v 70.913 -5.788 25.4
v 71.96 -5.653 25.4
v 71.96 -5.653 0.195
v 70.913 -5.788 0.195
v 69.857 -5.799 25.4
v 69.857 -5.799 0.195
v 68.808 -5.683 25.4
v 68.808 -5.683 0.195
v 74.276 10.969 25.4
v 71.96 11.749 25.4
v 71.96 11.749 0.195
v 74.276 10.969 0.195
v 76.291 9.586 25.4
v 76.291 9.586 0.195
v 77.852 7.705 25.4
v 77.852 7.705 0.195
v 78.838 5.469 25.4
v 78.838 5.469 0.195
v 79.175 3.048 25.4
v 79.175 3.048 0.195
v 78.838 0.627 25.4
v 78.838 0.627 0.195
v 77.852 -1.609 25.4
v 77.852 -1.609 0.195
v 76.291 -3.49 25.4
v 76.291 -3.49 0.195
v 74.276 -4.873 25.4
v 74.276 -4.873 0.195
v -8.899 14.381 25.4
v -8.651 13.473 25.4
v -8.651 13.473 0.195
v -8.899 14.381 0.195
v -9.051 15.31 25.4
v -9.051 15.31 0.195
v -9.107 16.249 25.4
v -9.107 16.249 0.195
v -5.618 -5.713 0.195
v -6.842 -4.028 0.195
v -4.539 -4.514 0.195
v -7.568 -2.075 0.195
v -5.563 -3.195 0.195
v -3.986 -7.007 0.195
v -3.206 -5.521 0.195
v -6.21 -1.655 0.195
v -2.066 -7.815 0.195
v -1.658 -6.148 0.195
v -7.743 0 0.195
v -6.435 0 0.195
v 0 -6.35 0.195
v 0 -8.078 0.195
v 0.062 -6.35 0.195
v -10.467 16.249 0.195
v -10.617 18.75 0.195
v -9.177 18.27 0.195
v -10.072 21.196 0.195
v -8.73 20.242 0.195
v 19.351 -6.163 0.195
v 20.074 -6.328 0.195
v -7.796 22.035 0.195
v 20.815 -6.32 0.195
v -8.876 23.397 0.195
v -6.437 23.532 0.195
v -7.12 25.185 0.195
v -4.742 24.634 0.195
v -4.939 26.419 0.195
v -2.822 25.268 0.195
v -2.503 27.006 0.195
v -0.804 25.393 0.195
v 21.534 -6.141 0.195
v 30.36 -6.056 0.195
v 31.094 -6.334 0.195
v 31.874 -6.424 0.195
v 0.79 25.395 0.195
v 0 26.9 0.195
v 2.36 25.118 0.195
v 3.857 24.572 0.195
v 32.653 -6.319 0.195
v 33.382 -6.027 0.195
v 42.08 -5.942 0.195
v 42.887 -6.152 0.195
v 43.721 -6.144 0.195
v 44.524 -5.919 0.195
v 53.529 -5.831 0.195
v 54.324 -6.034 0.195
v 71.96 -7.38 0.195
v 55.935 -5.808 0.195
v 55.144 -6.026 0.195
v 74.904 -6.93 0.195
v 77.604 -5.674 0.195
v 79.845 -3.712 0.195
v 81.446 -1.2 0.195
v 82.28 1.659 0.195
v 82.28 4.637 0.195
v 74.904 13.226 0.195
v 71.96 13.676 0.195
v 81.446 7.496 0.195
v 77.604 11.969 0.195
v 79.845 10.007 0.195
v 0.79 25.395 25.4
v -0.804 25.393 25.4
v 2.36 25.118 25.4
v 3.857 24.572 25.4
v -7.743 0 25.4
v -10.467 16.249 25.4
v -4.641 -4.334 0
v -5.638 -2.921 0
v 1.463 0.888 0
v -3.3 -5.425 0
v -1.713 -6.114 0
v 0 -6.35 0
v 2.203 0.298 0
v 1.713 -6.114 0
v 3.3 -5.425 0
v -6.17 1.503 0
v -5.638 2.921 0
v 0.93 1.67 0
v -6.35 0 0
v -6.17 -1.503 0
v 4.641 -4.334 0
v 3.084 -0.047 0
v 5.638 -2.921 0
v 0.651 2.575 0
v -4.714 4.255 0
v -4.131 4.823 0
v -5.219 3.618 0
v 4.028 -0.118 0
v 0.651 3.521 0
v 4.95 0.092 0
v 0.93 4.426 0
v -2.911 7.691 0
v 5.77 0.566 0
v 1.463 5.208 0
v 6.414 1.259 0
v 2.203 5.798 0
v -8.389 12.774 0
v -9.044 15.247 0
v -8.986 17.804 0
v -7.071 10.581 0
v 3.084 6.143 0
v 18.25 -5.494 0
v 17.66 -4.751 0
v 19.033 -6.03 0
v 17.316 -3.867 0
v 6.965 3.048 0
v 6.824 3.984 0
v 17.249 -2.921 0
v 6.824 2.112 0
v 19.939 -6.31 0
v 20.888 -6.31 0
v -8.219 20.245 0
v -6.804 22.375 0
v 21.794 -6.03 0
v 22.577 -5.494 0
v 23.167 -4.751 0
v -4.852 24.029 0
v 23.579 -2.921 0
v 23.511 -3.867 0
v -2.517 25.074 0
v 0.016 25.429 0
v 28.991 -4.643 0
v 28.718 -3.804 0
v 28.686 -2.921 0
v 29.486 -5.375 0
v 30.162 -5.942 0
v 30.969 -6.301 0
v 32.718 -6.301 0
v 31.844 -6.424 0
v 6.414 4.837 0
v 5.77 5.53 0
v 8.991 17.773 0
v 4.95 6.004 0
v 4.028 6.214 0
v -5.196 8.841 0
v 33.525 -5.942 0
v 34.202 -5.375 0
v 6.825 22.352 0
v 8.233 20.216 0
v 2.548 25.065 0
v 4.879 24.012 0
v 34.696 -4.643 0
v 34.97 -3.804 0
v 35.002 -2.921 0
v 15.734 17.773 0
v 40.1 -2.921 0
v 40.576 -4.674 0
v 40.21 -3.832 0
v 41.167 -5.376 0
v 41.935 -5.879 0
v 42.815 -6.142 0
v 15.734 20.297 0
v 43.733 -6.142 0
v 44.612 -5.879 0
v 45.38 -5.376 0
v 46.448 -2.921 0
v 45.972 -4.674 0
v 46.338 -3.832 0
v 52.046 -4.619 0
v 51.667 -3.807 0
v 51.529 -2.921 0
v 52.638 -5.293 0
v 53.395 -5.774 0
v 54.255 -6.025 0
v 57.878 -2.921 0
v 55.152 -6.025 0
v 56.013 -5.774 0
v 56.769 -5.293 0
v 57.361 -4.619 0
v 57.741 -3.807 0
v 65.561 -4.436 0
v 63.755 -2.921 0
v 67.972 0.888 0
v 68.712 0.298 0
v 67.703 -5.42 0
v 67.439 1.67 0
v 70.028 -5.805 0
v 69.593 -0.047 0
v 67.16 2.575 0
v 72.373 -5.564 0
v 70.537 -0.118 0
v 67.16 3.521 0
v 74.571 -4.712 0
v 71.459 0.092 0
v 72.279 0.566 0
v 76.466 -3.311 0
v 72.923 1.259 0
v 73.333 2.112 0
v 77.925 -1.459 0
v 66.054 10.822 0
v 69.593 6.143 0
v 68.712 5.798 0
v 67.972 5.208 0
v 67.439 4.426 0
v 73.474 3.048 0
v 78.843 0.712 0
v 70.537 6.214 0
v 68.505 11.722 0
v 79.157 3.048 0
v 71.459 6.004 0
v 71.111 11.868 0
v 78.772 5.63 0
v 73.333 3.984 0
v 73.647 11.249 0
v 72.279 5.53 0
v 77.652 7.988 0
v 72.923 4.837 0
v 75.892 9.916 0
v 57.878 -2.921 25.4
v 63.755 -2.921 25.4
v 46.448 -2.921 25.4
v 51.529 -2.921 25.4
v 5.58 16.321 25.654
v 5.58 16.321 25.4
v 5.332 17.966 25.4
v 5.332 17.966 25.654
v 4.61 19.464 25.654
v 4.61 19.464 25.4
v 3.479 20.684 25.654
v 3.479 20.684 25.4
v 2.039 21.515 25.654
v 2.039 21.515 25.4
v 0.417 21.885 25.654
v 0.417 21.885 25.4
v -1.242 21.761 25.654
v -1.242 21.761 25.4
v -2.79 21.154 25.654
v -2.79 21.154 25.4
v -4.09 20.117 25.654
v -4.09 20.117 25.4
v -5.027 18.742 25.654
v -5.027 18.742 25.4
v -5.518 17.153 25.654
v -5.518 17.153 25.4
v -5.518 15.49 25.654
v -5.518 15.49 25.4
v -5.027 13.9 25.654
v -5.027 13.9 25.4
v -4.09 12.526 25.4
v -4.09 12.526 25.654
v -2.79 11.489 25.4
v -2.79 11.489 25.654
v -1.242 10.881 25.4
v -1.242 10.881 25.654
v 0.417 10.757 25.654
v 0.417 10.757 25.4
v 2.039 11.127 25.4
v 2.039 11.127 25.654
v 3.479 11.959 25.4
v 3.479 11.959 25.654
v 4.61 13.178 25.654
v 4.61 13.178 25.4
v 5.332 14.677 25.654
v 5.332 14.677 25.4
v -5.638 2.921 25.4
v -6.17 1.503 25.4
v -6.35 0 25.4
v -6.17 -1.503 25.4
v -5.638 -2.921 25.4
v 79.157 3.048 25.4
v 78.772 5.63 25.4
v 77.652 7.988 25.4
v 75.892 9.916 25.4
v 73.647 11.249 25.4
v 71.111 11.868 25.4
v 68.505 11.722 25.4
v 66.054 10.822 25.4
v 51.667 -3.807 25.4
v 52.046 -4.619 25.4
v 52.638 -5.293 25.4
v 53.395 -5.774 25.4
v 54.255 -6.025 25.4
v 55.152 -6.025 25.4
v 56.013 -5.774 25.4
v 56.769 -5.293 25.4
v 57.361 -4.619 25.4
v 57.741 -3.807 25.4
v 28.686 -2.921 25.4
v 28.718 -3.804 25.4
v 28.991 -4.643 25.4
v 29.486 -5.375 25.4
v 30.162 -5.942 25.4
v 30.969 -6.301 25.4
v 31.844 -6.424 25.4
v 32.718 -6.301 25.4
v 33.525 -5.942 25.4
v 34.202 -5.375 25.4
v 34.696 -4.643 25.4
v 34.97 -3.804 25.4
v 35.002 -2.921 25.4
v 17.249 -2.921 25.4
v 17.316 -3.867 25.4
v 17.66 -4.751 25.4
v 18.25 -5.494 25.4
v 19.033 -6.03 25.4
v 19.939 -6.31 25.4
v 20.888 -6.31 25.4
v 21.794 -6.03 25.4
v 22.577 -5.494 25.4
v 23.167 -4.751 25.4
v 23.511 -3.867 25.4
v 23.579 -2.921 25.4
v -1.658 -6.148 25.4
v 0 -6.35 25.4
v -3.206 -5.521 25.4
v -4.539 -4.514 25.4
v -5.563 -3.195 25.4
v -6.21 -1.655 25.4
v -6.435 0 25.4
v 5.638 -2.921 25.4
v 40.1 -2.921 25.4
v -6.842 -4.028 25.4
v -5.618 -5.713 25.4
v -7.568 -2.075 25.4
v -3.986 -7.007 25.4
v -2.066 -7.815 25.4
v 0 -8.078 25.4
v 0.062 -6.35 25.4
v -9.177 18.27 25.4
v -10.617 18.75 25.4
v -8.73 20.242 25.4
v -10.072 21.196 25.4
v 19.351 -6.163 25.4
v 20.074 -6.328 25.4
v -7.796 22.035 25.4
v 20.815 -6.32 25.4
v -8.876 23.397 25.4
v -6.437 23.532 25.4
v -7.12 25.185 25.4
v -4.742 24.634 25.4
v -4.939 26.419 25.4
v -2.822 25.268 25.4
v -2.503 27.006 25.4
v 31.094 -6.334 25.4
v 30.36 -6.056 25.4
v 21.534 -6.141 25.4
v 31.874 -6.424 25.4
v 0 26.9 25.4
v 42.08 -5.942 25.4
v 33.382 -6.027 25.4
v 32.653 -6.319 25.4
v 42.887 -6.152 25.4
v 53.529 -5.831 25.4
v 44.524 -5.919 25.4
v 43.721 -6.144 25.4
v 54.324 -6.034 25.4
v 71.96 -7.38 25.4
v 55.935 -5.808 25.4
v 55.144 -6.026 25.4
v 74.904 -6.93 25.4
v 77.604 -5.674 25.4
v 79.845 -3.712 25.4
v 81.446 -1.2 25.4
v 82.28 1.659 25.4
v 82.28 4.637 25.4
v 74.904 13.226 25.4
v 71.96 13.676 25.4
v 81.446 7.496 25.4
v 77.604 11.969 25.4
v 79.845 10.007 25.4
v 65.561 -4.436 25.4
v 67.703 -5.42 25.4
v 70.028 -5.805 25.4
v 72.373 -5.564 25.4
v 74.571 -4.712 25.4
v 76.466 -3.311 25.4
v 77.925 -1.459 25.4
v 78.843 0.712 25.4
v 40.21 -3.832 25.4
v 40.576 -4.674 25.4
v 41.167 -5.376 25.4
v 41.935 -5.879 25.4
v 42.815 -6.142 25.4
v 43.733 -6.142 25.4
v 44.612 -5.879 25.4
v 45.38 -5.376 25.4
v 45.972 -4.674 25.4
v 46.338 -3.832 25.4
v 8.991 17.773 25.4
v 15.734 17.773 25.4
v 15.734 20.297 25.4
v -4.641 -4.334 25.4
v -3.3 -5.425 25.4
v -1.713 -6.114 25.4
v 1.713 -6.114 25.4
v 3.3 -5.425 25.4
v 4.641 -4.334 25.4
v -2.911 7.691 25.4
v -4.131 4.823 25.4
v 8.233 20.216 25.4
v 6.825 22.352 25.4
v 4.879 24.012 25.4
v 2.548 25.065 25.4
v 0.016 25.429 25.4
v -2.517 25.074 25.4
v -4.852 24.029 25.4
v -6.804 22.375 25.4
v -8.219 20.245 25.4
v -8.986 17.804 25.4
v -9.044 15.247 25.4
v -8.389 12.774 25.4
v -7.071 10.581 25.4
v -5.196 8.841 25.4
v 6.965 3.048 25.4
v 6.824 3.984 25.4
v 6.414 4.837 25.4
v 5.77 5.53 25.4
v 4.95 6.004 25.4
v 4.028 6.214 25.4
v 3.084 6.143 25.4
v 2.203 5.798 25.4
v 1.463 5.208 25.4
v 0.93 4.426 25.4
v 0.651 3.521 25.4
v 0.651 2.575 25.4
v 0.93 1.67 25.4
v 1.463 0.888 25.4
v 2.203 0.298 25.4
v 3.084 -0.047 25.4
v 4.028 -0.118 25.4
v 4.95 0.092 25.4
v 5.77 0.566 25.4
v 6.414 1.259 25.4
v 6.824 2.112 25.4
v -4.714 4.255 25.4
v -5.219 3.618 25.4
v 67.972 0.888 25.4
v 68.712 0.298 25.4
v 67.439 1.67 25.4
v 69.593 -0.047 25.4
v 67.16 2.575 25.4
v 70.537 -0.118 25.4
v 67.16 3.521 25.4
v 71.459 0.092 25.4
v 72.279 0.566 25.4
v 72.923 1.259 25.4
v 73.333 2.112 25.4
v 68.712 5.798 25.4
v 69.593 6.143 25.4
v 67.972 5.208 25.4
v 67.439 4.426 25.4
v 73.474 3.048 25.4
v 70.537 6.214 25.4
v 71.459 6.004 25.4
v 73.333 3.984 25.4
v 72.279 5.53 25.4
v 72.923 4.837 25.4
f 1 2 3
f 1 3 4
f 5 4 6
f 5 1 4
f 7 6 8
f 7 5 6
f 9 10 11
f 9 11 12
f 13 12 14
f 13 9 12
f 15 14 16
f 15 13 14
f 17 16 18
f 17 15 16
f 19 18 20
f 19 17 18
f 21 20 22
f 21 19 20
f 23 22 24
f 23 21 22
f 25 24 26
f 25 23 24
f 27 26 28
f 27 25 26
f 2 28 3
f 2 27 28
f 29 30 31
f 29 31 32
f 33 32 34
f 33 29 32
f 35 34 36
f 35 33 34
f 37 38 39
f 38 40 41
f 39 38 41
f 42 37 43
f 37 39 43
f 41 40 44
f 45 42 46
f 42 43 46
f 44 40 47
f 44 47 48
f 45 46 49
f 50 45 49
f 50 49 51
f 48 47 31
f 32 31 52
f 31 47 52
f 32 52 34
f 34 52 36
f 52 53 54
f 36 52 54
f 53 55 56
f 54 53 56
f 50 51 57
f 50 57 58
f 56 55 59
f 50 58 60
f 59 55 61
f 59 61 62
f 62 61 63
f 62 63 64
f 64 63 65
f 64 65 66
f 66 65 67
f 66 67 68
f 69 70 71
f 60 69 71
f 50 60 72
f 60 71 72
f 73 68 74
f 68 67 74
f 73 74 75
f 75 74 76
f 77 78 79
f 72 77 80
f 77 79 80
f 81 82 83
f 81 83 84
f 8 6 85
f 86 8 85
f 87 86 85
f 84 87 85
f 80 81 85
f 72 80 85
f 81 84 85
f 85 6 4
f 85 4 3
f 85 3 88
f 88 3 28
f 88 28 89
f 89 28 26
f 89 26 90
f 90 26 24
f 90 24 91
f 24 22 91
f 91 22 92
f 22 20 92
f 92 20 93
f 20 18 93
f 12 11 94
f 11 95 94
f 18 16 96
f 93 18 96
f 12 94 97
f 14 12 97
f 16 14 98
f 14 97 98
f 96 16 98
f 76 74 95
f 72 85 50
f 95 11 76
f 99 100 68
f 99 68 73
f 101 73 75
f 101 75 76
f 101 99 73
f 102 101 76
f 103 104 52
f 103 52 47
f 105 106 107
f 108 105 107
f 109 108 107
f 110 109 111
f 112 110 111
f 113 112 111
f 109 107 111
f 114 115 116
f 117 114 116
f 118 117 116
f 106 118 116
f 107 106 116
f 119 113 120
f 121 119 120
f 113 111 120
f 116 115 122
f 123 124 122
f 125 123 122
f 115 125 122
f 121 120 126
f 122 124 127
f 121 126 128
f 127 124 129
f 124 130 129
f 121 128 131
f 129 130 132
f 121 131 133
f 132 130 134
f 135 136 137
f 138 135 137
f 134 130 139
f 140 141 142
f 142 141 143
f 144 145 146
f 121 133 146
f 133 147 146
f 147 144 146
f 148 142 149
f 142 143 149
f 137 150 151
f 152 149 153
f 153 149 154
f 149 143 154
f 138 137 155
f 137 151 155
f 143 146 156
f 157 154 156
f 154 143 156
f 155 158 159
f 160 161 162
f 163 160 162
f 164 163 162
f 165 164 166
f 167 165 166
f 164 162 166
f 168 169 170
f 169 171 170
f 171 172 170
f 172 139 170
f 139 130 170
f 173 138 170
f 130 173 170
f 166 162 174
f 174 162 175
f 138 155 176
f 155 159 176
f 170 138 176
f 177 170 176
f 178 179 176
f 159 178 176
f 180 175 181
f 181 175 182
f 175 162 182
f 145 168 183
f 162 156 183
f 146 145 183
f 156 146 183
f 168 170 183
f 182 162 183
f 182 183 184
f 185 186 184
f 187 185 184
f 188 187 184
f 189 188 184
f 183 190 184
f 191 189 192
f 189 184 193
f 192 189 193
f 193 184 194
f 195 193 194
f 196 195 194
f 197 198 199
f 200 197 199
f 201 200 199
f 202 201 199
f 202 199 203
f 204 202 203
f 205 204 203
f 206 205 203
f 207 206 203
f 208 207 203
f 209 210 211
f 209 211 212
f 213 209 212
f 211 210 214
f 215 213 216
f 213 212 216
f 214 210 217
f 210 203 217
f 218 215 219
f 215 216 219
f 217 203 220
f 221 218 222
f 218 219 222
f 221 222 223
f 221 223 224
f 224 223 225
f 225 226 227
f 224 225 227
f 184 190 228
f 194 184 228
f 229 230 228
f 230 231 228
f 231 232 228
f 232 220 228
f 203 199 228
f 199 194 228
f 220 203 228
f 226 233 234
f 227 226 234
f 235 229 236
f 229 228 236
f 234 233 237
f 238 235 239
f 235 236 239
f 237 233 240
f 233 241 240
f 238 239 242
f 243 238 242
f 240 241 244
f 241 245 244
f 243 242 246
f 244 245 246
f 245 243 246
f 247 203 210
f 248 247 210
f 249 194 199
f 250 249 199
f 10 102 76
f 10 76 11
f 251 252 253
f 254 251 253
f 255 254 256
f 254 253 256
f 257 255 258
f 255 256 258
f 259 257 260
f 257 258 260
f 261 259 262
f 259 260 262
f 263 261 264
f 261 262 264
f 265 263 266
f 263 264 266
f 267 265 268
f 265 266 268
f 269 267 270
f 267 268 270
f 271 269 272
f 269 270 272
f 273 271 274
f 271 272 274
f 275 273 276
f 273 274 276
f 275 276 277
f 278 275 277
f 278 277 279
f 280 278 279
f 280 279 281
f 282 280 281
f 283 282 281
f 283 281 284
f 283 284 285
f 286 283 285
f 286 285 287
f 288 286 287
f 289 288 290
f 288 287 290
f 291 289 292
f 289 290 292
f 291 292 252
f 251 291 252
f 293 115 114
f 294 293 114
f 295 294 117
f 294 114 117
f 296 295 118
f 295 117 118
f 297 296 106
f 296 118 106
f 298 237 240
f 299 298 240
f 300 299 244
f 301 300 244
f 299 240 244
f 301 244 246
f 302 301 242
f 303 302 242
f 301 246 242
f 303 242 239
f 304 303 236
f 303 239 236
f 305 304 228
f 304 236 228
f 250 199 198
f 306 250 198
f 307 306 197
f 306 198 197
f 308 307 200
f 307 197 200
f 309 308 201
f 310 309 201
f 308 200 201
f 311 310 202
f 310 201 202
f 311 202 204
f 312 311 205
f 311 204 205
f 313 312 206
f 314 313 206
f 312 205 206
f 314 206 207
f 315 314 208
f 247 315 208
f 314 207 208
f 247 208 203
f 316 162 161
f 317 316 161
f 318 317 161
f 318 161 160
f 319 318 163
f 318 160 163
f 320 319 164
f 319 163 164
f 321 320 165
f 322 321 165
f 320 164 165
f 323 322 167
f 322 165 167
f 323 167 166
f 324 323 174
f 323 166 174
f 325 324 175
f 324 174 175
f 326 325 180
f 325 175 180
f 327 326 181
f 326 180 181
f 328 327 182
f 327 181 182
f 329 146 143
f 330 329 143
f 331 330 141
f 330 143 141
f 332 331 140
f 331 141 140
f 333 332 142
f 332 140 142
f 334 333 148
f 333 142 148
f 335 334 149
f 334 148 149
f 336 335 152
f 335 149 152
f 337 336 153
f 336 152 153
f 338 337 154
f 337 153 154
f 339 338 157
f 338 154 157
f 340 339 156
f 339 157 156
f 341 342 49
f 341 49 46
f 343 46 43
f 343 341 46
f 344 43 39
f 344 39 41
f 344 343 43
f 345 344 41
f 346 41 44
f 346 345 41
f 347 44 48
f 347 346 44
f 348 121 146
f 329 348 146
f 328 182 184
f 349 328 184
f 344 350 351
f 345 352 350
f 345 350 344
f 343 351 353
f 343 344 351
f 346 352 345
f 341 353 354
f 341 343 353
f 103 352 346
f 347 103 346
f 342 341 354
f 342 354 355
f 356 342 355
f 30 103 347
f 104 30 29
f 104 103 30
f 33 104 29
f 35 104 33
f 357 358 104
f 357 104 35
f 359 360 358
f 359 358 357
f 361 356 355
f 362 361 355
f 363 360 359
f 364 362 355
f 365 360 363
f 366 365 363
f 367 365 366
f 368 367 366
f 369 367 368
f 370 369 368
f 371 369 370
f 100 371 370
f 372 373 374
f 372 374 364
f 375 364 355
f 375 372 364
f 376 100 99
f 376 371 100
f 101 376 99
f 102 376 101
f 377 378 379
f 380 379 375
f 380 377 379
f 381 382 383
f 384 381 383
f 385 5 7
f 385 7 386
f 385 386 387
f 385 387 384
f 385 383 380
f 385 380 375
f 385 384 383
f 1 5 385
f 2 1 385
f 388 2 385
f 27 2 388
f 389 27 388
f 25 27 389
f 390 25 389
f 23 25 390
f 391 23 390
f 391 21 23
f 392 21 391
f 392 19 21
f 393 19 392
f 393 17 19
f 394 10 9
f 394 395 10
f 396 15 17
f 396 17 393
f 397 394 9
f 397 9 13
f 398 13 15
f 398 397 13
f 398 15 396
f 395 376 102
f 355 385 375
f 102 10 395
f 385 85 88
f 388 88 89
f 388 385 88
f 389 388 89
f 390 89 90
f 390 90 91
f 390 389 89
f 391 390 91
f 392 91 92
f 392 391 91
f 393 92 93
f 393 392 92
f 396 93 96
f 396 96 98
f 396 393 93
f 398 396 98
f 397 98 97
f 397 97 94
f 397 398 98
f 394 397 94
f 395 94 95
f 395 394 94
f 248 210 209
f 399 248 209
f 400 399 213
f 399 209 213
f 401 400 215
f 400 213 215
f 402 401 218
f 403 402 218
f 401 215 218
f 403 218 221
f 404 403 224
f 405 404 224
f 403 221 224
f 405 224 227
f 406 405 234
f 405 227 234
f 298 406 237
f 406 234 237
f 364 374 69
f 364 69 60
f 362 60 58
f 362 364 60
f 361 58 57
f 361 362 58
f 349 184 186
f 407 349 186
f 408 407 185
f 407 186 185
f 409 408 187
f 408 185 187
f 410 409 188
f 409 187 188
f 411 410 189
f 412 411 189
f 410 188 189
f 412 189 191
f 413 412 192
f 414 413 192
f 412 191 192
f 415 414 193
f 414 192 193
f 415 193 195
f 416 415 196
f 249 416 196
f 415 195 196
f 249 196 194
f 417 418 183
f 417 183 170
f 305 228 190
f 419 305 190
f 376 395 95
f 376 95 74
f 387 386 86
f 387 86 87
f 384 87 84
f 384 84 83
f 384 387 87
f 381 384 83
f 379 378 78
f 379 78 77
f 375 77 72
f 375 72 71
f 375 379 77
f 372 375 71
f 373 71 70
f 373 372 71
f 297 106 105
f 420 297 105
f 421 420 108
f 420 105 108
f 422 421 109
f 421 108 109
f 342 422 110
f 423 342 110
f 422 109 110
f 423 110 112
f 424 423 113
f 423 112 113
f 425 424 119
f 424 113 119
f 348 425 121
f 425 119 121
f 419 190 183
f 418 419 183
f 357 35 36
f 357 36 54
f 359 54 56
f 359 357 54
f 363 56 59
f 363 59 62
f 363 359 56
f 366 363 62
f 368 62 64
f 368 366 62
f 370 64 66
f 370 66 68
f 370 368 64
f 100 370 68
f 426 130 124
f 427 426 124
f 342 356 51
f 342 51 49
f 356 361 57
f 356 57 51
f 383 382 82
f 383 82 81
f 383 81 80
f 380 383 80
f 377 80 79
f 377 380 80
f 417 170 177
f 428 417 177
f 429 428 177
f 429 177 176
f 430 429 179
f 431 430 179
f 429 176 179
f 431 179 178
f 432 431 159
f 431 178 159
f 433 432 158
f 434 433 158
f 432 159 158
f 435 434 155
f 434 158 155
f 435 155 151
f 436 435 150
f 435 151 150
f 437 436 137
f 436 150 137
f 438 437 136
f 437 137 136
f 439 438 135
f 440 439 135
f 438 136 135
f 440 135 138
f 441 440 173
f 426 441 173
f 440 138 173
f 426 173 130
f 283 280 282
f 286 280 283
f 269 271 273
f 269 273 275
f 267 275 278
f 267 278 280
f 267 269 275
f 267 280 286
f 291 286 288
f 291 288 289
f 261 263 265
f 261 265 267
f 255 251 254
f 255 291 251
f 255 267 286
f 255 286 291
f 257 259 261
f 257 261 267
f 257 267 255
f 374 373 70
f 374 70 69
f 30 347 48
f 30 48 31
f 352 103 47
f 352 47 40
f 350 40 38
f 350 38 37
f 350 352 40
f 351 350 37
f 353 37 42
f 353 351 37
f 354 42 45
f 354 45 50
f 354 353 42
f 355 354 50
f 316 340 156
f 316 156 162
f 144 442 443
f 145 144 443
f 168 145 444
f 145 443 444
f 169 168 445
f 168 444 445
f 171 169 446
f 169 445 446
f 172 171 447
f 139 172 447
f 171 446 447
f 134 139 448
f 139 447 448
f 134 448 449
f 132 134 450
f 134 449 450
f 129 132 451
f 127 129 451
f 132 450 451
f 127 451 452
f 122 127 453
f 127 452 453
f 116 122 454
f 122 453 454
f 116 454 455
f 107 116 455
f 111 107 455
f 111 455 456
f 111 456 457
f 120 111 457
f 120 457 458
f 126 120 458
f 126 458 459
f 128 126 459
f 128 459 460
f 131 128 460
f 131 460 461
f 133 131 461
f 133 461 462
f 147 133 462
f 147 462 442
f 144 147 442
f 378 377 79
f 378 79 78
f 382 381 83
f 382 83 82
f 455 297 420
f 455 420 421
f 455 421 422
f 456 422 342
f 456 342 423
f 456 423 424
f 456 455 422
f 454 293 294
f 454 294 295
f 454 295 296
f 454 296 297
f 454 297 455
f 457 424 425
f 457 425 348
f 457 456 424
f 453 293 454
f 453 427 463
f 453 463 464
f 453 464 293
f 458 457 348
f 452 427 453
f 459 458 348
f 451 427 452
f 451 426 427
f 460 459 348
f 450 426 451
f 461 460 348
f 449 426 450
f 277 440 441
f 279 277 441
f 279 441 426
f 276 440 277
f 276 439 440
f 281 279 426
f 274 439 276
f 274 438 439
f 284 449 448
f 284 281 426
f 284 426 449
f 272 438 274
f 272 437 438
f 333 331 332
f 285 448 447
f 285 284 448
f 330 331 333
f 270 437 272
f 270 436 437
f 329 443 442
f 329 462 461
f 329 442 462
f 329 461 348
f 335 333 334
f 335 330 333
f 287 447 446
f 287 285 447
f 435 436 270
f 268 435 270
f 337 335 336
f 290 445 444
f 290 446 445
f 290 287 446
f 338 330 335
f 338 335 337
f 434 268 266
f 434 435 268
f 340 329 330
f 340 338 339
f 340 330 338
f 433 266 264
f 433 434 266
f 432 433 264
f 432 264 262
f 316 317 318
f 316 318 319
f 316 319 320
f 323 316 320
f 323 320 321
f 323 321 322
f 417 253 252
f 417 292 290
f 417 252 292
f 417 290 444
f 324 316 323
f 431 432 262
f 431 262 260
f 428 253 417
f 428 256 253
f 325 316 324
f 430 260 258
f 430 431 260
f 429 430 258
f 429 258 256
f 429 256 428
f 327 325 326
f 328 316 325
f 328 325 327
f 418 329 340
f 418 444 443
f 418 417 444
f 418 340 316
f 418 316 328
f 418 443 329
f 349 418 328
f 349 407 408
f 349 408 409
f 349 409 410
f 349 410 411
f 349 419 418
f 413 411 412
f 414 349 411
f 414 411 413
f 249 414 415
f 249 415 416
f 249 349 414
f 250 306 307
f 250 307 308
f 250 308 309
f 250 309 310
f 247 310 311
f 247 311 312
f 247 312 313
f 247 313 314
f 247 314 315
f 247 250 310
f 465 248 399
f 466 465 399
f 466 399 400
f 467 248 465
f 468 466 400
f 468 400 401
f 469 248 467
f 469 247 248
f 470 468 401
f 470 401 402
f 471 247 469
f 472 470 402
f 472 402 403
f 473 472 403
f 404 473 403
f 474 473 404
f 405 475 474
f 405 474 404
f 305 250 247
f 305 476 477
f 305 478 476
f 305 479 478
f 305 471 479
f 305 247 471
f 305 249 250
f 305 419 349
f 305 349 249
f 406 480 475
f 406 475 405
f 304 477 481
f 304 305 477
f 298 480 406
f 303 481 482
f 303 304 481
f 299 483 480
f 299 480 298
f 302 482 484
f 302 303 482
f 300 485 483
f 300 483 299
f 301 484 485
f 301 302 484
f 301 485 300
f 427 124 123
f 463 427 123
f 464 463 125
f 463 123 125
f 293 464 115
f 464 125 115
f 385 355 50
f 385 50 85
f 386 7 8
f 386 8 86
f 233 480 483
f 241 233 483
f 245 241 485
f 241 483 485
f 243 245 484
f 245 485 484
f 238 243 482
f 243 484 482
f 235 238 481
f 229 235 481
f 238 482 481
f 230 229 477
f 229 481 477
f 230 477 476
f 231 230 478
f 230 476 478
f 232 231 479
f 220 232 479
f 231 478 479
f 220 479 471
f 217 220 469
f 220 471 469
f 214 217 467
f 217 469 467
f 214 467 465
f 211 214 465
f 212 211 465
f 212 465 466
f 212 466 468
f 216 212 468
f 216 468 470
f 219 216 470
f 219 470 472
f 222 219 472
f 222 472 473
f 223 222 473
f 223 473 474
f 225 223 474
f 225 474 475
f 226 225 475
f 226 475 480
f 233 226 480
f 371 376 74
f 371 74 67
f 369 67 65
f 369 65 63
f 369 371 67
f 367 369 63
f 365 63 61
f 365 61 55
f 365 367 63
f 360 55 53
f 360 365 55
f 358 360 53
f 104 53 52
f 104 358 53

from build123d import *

# Parameters (mm, degrees)
F1_DEPTH = 25.4
F3_DEPTH = 25.20536
F4_R     = 5.579874
F5_DEPTH = 0.254
F6_R     = 3.175
F7_DEPTH = 44.39207
F8_R     = 3.175
F9_DEPTH = 31.86293


with BuildPart() as f1:
    # F0 (on Top) → F1 (new body)
    with BuildSketch(Plane.XY):
        with BuildLine():
            Line((-5.638285, 0), (-5.638285, 2.921))
            ThreePointArc((-5.638285, 2.921), (-6.35, 0), (-5.638285, -2.921))
            Line((-5.638285, -2.921), (-5.638285, 0))
        make_face()
        with BuildLine():
            ThreePointArc((-5.638285, -2.921), (0, -6.35), (5.638285, -2.921))
            Line((5.638285, -2.921), (-5.638285, -2.921))
        make_face()
        with BuildLine():
            ThreePointArc((79.156951, 3.048), (74.819142, 10.665679), (66.054377, 10.822231))
            Line((66.054377, 10.822231), (75.641715, 9.017))
            Line((75.641715, 9.017), (75.641715, -2.921))
            Line((75.641715, -2.921), (63.754906, -2.921))
            ThreePointArc((63.754906, -2.921), (73.500084, -5.211115), (79.156951, 3.048))
        make_face()
        with BuildLine():
            ThreePointArc((51.528946, -2.921), (54.7037, -6.056425), (57.878453, -2.921))
            Line((57.878453, -2.921), (51.528946, -2.921))
        make_face()
        with BuildLine():
            Line((46.447709, -2.921), (40.09969, -2.921))
            ThreePointArc((40.09969, -2.921), (43.2737, -6.175297), (46.447709, -2.921))
        make_face()
        with BuildLine():
            Line((35.001715, -2.921), (28.685684, -2.921))
            ThreePointArc((28.685684, -2.921), (31.8437, -6.42397), (35.001715, -2.921))
        make_face()
        with BuildLine():
            Line((23.578851, -2.921), (17.248548, -2.921))
            ThreePointArc((17.248548, -2.921), (20.4137, -6.345881), (23.578851, -2.921))
        make_face()
        with BuildLine():
            ThreePointArc((8.99139, 17.772627), (-5.886569, 23.271042), (-2.910999, 7.691176))
            ThreePointArc((-2.910999, 7.691176), (5.312199, 8.923104), (9.10778, 16.321225))
            ThreePointArc((9.10778, 16.321225), (9.078636, 17.049256), (8.99139, 17.772627))
        make_face()
        with BuildLine():
            Line((-5.638285, 2.921), (5.638285, 2.921))
            ThreePointArc((5.638285, 2.921), (1.213203, 6.233028), (-4.131079, 4.822519))
            ThreePointArc((-4.131079, 4.822519), (-4.97635, 3.944419), (-5.638285, 2.921))
        make_face()
        with BuildLine():
            Line((75.641715, 9.017), (66.054377, 10.822231))
            ThreePointArc((66.054377, 10.822231), (61.563085, 4.509714), (63.754906, -2.921))
            Line((63.754906, -2.921), (75.641715, -2.921))
            Line((75.641715, -2.921), (75.641715, 9.017))
        make_face()
        with BuildLine():
            ThreePointArc((5.638285, -2.921), (6.169506, -1.503228), (6.35, 0))
            ThreePointArc((6.35, 0), (6.169506, 1.503228), (5.638285, 2.921))
            Line((5.638285, 2.921), (-5.638285, 2.921))
            Line((-5.638285, 2.921), (-5.638285, 0))
            Line((-5.638285, 0), (-5.638285, -2.921))
            Line((-5.638285, -2.921), (5.638285, -2.921))
        make_face()
        with BuildLine():
            ThreePointArc((5.638285, 2.921), (6.169506, 1.503228), (6.35, 0))
            ThreePointArc((6.35, 0), (6.169506, -1.503228), (5.638285, -2.921))
            Line((5.638285, -2.921), (17.248548, -2.921))
            Line((17.248548, -2.921), (23.578851, -2.921))
            Line((23.578851, -2.921), (28.685684, -2.921))
            Line((28.685684, -2.921), (35.001715, -2.921))
            Line((35.001715, -2.921), (40.09969, -2.921))
            Line((40.09969, -2.921), (46.447709, -2.921))
            Line((46.447709, -2.921), (51.528946, -2.921))
            Line((51.528946, -2.921), (57.878453, -2.921))
            Line((57.878453, -2.921), (63.754906, -2.921))
            ThreePointArc((63.754906, -2.921), (61.563085, 4.509714), (66.054377, 10.822231))
            Line((66.054377, 10.822231), (15.734452, 20.297137))
            Line((15.734452, 20.297137), (15.734452, 17.772627))
            Line((15.734452, 17.772627), (15.734452, 15.979137))
            Line((15.734452, 15.979137), (11.837592, 10.647411))
            Line((11.837592, 10.647411), (5.638285, 2.921))
        make_face()
        with BuildLine():
            ThreePointArc((-4.131079, 4.822519), (1.213203, 6.233028), (5.638285, 2.921))
            Line((5.638285, 2.921), (11.837592, 10.647411))
            Line((11.837592, 10.647411), (15.734452, 15.979137))
            Line((15.734452, 15.979137), (15.734452, 17.772627))
            Line((15.734452, 17.772627), (8.99139, 17.772627))
            ThreePointArc((8.99139, 17.772627), (9.078636, 17.049256), (9.10778, 16.321225))
            ThreePointArc((9.10778, 16.321225), (5.312199, 8.923104), (-2.910999, 7.691176))
            Line((-2.910999, 7.691176), (-4.131079, 4.822519))
        make_face()
    extrude(amount=F1_DEPTH)

    # F4 (on face) → F5 (join)
    with BuildSketch(Plane.XY.offset(25.4)):
        with Locations((0, 16.321225)):
            Circle(F4_R)
    extrude(amount=F5_DEPTH)

    # F6 (on face) → F7 (cut)
    with BuildSketch(Plane.XY.offset(25.4)):
        with Locations((70.299298, 3.048)):
            Circle(F6_R)
    extrude(amount=-F7_DEPTH, mode=Mode.SUBTRACT)

    # F8 (on face) → F9 (cut)
    with BuildSketch(Plane.XY.offset(25.4)):
        with Locations((3.790446, 3.048)):
            Circle(F8_R)
    extrude(amount=-F9_DEPTH, mode=Mode.SUBTRACT)


with BuildPart() as f3:
    # F2 (on face) → F3 (new body)
    with BuildSketch(Plane.XY.offset(25.4)):
        with BuildLine():
            Line((71.960053, 13.675588), (0, 26.900332))
            ThreePointArc((0, 26.900332), (-8.060024, 24.352305), (-10.466903, 16.249011))
            Line((-10.466903, 16.249011), (-7.74266, 0))
            ThreePointArc((-7.74266, 0), (-5.617745, -5.712793), (0, -8.07758))
            Line((0, -8.07758), (71.960053, -7.379851))
            ThreePointArc((71.960053, -7.379851), (82.38619, 3.147869), (71.960053, 13.675588))
        make_face()
        with BuildLine():
            Line((3.857274, 24.571867), (71.960053, 11.74857))
            ThreePointArc((71.960053, 11.74857), (79.175257, 3.048), (71.960053, -5.65257))
            ThreePointArc((71.960053, -5.65257), (70.385178, -5.809237), (68.807561, -5.683137))
            Line((68.807561, -5.683137), (55.934991, -5.80795))
            ThreePointArc((55.934991, -5.80795), (54.734483, -6.056276), (53.529386, -5.831275))
            Line((53.529386, -5.831275), (44.524382, -5.918588))
            ThreePointArc((44.524382, -5.918588), (43.304483, -6.175148), (42.079839, -5.94229))
            Line((42.079839, -5.94229), (33.381634, -6.026628))
            ThreePointArc((33.381634, -6.026628), (31.874483, -6.423821), (30.359914, -6.055927))
            Line((30.359914, -6.055927), (21.534436, -6.141499))
            ThreePointArc((21.534436, -6.141499), (20.444483, -6.345732), (19.350775, -6.162672))
            Line((19.350775, -6.162672), (0.061567, -6.349702))
            Line((0.061567, -6.349702), (0, -6.350298))
            ThreePointArc((0, -6.350298), (-4.53851, -4.513691), (-6.435294, 0))
            Line((-6.435294, 0), (-8.650971, 13.473006))
            ThreePointArc((-8.650971, 13.473006), (-8.987064, 14.843275), (-9.107494, 16.249011))
            ThreePointArc((-9.107494, 16.249011), (-7.164895, 22.827532), (-0.803566, 25.393487))
            ThreePointArc((-0.803566, 25.393487), (1.581154, 25.290707), (3.857274, 24.571867))
        make_face(mode=Mode.SUBTRACT)
    extrude(amount=-F3_DEPTH)


solid = Compound([f1.part, f3.part])
